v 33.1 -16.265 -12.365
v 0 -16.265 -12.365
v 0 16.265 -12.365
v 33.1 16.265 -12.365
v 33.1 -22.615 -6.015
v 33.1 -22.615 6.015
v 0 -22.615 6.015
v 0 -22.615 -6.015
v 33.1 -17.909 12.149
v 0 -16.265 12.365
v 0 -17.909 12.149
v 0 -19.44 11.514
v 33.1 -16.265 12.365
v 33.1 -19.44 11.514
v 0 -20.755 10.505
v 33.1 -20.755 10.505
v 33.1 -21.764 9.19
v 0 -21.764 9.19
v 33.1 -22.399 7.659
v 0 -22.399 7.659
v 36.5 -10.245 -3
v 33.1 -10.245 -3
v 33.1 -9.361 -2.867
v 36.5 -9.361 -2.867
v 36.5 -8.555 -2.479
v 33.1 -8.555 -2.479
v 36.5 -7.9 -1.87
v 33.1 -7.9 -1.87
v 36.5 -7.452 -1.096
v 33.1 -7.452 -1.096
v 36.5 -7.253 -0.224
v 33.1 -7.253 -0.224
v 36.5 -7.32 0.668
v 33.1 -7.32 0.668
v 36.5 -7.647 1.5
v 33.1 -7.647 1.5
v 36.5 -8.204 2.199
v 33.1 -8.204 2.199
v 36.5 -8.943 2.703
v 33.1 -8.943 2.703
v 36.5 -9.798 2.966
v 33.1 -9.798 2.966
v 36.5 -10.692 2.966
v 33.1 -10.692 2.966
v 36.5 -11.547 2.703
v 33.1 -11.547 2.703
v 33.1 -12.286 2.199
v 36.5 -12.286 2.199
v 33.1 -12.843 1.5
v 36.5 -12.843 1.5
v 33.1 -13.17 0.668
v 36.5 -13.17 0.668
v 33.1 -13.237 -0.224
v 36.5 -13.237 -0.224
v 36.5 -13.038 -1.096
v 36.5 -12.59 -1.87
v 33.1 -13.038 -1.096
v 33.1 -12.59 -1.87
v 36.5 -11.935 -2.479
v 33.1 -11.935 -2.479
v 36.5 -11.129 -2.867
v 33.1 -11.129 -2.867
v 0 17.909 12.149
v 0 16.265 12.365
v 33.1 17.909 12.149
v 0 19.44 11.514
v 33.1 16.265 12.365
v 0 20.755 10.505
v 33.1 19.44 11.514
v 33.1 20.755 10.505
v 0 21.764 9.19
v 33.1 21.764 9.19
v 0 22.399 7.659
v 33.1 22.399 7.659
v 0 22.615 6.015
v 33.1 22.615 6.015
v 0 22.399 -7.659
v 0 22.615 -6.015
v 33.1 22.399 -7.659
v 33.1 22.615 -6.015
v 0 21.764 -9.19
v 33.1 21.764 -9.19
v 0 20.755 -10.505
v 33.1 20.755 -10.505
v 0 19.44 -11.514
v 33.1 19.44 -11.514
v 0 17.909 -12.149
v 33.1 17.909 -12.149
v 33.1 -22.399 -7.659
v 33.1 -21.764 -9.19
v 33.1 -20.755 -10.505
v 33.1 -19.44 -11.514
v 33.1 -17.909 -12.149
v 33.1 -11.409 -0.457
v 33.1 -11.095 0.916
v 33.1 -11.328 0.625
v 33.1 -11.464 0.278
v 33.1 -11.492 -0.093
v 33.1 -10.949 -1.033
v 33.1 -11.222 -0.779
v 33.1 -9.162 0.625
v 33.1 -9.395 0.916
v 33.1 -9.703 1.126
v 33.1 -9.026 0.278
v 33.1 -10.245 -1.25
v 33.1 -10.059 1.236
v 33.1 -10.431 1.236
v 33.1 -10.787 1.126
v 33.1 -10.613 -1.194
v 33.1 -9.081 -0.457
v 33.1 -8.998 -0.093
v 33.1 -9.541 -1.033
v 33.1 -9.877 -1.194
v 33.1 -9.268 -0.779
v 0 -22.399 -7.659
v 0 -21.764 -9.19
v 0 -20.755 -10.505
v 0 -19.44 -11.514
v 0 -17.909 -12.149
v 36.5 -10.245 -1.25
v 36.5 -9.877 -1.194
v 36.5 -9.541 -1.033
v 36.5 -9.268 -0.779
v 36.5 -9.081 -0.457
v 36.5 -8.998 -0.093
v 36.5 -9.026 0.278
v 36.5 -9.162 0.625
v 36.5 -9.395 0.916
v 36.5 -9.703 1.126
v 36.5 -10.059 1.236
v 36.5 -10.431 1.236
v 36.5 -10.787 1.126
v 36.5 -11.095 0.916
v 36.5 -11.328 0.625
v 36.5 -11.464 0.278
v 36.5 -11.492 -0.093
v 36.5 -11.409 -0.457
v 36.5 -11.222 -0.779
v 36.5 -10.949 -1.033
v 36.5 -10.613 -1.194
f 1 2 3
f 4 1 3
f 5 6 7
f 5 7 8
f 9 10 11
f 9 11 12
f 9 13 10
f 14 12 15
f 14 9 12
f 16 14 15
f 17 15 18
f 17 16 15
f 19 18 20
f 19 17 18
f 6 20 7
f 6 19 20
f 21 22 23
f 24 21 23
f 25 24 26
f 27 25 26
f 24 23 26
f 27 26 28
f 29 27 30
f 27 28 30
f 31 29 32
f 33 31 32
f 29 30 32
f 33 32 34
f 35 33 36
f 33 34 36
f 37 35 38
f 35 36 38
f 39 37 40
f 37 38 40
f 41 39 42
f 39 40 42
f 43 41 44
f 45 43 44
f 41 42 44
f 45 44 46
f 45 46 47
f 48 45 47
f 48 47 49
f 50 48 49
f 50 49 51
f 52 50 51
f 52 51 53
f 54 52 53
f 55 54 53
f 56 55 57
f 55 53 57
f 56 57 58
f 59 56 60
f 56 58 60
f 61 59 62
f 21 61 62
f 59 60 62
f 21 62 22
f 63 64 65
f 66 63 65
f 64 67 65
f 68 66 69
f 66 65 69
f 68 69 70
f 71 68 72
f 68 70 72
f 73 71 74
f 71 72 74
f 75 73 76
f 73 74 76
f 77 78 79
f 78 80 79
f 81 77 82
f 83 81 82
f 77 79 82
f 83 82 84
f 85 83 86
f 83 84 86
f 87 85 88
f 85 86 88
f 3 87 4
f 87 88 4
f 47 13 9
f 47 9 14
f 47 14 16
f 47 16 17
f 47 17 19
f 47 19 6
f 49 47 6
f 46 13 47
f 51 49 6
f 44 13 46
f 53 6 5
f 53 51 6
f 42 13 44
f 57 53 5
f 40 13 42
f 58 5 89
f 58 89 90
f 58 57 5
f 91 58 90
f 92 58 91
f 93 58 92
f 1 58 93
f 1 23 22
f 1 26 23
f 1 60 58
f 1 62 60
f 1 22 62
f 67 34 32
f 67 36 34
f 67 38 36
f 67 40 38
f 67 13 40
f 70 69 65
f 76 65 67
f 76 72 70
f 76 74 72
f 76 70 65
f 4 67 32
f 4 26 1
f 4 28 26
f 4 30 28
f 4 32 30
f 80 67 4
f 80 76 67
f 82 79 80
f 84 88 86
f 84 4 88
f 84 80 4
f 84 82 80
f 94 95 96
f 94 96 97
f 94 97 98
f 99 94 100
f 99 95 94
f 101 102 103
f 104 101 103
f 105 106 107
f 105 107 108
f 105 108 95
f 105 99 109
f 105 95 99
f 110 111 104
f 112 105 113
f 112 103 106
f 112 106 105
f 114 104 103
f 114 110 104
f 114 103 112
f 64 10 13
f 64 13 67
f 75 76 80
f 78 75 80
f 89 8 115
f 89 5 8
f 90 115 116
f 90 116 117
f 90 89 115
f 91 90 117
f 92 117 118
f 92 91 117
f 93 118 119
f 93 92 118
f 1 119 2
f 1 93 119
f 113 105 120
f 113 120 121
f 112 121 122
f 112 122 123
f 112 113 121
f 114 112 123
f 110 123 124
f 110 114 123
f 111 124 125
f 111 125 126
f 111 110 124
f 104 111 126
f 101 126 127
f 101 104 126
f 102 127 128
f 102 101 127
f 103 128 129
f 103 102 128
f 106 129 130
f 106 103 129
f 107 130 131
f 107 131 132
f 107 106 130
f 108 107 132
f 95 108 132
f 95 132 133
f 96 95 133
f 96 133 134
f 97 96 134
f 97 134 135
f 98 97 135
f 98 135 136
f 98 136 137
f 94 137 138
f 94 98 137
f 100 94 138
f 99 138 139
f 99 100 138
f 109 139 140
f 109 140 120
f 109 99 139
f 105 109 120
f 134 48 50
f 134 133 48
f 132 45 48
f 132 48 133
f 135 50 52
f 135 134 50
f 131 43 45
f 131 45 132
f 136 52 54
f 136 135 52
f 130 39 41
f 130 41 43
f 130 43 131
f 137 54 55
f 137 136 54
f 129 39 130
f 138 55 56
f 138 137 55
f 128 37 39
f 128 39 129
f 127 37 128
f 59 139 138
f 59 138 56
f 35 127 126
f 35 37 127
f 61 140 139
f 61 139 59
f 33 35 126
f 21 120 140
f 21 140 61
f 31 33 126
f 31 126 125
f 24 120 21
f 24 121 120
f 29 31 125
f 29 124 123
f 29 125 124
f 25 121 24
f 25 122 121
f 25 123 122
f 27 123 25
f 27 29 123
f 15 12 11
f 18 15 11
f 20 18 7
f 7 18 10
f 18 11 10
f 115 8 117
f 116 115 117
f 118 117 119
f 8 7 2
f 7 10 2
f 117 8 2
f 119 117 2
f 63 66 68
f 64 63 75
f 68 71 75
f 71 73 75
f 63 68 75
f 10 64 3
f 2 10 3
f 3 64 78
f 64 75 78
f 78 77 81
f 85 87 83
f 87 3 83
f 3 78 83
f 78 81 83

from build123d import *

# Parameters (mm, degrees)
SKETCH1_W           = 24.73
SKETCH1_H           = 45.23
BOSS_EXTRUDE1_DEPTH = 33.1
SKETCH2_R           = 3
SKETCH2_R_2         = 1.25
BOSS_EXTRUDE2_DEPTH = 3.4
FILLET1_R           = 6.35


with BuildPart() as part:
    # Sketch1 → Boss-Extrude1 (new body)
    with BuildSketch(Plane(origin=(0, 0, 0), x_dir=(0, 0, -1), z_dir=(1, 0, 0))):
        Rectangle(SKETCH1_W, SKETCH1_H)
    extrude(amount=BOSS_EXTRUDE1_DEPTH)

    # Sketch2 → Boss-Extrude2 (add)
    with BuildSketch(Plane(origin=(33.1, 0, 0), x_dir=(0, 0, -1), z_dir=(1, 0, 0))):
        with Locations((0, -10.245)):
            Circle(SKETCH2_R)
        with Locations((0, -10.245)):
            Circle(SKETCH2_R_2, mode=Mode.SUBTRACT)
    extrude(amount=BOSS_EXTRUDE2_DEPTH)

    # Fillet1
    fillet1_edges = [part.edges().sort_by_distance(p)[0] for p in [
        (16.55, -22.615, -12.365),
        (16.55, -22.615, 12.365),
        (16.55, 22.615, 12.365),
        (16.55, 22.615, -12.365),
    ]]
    fillet(fillet1_edges, radius=FILLET1_R)


solid = part.part
